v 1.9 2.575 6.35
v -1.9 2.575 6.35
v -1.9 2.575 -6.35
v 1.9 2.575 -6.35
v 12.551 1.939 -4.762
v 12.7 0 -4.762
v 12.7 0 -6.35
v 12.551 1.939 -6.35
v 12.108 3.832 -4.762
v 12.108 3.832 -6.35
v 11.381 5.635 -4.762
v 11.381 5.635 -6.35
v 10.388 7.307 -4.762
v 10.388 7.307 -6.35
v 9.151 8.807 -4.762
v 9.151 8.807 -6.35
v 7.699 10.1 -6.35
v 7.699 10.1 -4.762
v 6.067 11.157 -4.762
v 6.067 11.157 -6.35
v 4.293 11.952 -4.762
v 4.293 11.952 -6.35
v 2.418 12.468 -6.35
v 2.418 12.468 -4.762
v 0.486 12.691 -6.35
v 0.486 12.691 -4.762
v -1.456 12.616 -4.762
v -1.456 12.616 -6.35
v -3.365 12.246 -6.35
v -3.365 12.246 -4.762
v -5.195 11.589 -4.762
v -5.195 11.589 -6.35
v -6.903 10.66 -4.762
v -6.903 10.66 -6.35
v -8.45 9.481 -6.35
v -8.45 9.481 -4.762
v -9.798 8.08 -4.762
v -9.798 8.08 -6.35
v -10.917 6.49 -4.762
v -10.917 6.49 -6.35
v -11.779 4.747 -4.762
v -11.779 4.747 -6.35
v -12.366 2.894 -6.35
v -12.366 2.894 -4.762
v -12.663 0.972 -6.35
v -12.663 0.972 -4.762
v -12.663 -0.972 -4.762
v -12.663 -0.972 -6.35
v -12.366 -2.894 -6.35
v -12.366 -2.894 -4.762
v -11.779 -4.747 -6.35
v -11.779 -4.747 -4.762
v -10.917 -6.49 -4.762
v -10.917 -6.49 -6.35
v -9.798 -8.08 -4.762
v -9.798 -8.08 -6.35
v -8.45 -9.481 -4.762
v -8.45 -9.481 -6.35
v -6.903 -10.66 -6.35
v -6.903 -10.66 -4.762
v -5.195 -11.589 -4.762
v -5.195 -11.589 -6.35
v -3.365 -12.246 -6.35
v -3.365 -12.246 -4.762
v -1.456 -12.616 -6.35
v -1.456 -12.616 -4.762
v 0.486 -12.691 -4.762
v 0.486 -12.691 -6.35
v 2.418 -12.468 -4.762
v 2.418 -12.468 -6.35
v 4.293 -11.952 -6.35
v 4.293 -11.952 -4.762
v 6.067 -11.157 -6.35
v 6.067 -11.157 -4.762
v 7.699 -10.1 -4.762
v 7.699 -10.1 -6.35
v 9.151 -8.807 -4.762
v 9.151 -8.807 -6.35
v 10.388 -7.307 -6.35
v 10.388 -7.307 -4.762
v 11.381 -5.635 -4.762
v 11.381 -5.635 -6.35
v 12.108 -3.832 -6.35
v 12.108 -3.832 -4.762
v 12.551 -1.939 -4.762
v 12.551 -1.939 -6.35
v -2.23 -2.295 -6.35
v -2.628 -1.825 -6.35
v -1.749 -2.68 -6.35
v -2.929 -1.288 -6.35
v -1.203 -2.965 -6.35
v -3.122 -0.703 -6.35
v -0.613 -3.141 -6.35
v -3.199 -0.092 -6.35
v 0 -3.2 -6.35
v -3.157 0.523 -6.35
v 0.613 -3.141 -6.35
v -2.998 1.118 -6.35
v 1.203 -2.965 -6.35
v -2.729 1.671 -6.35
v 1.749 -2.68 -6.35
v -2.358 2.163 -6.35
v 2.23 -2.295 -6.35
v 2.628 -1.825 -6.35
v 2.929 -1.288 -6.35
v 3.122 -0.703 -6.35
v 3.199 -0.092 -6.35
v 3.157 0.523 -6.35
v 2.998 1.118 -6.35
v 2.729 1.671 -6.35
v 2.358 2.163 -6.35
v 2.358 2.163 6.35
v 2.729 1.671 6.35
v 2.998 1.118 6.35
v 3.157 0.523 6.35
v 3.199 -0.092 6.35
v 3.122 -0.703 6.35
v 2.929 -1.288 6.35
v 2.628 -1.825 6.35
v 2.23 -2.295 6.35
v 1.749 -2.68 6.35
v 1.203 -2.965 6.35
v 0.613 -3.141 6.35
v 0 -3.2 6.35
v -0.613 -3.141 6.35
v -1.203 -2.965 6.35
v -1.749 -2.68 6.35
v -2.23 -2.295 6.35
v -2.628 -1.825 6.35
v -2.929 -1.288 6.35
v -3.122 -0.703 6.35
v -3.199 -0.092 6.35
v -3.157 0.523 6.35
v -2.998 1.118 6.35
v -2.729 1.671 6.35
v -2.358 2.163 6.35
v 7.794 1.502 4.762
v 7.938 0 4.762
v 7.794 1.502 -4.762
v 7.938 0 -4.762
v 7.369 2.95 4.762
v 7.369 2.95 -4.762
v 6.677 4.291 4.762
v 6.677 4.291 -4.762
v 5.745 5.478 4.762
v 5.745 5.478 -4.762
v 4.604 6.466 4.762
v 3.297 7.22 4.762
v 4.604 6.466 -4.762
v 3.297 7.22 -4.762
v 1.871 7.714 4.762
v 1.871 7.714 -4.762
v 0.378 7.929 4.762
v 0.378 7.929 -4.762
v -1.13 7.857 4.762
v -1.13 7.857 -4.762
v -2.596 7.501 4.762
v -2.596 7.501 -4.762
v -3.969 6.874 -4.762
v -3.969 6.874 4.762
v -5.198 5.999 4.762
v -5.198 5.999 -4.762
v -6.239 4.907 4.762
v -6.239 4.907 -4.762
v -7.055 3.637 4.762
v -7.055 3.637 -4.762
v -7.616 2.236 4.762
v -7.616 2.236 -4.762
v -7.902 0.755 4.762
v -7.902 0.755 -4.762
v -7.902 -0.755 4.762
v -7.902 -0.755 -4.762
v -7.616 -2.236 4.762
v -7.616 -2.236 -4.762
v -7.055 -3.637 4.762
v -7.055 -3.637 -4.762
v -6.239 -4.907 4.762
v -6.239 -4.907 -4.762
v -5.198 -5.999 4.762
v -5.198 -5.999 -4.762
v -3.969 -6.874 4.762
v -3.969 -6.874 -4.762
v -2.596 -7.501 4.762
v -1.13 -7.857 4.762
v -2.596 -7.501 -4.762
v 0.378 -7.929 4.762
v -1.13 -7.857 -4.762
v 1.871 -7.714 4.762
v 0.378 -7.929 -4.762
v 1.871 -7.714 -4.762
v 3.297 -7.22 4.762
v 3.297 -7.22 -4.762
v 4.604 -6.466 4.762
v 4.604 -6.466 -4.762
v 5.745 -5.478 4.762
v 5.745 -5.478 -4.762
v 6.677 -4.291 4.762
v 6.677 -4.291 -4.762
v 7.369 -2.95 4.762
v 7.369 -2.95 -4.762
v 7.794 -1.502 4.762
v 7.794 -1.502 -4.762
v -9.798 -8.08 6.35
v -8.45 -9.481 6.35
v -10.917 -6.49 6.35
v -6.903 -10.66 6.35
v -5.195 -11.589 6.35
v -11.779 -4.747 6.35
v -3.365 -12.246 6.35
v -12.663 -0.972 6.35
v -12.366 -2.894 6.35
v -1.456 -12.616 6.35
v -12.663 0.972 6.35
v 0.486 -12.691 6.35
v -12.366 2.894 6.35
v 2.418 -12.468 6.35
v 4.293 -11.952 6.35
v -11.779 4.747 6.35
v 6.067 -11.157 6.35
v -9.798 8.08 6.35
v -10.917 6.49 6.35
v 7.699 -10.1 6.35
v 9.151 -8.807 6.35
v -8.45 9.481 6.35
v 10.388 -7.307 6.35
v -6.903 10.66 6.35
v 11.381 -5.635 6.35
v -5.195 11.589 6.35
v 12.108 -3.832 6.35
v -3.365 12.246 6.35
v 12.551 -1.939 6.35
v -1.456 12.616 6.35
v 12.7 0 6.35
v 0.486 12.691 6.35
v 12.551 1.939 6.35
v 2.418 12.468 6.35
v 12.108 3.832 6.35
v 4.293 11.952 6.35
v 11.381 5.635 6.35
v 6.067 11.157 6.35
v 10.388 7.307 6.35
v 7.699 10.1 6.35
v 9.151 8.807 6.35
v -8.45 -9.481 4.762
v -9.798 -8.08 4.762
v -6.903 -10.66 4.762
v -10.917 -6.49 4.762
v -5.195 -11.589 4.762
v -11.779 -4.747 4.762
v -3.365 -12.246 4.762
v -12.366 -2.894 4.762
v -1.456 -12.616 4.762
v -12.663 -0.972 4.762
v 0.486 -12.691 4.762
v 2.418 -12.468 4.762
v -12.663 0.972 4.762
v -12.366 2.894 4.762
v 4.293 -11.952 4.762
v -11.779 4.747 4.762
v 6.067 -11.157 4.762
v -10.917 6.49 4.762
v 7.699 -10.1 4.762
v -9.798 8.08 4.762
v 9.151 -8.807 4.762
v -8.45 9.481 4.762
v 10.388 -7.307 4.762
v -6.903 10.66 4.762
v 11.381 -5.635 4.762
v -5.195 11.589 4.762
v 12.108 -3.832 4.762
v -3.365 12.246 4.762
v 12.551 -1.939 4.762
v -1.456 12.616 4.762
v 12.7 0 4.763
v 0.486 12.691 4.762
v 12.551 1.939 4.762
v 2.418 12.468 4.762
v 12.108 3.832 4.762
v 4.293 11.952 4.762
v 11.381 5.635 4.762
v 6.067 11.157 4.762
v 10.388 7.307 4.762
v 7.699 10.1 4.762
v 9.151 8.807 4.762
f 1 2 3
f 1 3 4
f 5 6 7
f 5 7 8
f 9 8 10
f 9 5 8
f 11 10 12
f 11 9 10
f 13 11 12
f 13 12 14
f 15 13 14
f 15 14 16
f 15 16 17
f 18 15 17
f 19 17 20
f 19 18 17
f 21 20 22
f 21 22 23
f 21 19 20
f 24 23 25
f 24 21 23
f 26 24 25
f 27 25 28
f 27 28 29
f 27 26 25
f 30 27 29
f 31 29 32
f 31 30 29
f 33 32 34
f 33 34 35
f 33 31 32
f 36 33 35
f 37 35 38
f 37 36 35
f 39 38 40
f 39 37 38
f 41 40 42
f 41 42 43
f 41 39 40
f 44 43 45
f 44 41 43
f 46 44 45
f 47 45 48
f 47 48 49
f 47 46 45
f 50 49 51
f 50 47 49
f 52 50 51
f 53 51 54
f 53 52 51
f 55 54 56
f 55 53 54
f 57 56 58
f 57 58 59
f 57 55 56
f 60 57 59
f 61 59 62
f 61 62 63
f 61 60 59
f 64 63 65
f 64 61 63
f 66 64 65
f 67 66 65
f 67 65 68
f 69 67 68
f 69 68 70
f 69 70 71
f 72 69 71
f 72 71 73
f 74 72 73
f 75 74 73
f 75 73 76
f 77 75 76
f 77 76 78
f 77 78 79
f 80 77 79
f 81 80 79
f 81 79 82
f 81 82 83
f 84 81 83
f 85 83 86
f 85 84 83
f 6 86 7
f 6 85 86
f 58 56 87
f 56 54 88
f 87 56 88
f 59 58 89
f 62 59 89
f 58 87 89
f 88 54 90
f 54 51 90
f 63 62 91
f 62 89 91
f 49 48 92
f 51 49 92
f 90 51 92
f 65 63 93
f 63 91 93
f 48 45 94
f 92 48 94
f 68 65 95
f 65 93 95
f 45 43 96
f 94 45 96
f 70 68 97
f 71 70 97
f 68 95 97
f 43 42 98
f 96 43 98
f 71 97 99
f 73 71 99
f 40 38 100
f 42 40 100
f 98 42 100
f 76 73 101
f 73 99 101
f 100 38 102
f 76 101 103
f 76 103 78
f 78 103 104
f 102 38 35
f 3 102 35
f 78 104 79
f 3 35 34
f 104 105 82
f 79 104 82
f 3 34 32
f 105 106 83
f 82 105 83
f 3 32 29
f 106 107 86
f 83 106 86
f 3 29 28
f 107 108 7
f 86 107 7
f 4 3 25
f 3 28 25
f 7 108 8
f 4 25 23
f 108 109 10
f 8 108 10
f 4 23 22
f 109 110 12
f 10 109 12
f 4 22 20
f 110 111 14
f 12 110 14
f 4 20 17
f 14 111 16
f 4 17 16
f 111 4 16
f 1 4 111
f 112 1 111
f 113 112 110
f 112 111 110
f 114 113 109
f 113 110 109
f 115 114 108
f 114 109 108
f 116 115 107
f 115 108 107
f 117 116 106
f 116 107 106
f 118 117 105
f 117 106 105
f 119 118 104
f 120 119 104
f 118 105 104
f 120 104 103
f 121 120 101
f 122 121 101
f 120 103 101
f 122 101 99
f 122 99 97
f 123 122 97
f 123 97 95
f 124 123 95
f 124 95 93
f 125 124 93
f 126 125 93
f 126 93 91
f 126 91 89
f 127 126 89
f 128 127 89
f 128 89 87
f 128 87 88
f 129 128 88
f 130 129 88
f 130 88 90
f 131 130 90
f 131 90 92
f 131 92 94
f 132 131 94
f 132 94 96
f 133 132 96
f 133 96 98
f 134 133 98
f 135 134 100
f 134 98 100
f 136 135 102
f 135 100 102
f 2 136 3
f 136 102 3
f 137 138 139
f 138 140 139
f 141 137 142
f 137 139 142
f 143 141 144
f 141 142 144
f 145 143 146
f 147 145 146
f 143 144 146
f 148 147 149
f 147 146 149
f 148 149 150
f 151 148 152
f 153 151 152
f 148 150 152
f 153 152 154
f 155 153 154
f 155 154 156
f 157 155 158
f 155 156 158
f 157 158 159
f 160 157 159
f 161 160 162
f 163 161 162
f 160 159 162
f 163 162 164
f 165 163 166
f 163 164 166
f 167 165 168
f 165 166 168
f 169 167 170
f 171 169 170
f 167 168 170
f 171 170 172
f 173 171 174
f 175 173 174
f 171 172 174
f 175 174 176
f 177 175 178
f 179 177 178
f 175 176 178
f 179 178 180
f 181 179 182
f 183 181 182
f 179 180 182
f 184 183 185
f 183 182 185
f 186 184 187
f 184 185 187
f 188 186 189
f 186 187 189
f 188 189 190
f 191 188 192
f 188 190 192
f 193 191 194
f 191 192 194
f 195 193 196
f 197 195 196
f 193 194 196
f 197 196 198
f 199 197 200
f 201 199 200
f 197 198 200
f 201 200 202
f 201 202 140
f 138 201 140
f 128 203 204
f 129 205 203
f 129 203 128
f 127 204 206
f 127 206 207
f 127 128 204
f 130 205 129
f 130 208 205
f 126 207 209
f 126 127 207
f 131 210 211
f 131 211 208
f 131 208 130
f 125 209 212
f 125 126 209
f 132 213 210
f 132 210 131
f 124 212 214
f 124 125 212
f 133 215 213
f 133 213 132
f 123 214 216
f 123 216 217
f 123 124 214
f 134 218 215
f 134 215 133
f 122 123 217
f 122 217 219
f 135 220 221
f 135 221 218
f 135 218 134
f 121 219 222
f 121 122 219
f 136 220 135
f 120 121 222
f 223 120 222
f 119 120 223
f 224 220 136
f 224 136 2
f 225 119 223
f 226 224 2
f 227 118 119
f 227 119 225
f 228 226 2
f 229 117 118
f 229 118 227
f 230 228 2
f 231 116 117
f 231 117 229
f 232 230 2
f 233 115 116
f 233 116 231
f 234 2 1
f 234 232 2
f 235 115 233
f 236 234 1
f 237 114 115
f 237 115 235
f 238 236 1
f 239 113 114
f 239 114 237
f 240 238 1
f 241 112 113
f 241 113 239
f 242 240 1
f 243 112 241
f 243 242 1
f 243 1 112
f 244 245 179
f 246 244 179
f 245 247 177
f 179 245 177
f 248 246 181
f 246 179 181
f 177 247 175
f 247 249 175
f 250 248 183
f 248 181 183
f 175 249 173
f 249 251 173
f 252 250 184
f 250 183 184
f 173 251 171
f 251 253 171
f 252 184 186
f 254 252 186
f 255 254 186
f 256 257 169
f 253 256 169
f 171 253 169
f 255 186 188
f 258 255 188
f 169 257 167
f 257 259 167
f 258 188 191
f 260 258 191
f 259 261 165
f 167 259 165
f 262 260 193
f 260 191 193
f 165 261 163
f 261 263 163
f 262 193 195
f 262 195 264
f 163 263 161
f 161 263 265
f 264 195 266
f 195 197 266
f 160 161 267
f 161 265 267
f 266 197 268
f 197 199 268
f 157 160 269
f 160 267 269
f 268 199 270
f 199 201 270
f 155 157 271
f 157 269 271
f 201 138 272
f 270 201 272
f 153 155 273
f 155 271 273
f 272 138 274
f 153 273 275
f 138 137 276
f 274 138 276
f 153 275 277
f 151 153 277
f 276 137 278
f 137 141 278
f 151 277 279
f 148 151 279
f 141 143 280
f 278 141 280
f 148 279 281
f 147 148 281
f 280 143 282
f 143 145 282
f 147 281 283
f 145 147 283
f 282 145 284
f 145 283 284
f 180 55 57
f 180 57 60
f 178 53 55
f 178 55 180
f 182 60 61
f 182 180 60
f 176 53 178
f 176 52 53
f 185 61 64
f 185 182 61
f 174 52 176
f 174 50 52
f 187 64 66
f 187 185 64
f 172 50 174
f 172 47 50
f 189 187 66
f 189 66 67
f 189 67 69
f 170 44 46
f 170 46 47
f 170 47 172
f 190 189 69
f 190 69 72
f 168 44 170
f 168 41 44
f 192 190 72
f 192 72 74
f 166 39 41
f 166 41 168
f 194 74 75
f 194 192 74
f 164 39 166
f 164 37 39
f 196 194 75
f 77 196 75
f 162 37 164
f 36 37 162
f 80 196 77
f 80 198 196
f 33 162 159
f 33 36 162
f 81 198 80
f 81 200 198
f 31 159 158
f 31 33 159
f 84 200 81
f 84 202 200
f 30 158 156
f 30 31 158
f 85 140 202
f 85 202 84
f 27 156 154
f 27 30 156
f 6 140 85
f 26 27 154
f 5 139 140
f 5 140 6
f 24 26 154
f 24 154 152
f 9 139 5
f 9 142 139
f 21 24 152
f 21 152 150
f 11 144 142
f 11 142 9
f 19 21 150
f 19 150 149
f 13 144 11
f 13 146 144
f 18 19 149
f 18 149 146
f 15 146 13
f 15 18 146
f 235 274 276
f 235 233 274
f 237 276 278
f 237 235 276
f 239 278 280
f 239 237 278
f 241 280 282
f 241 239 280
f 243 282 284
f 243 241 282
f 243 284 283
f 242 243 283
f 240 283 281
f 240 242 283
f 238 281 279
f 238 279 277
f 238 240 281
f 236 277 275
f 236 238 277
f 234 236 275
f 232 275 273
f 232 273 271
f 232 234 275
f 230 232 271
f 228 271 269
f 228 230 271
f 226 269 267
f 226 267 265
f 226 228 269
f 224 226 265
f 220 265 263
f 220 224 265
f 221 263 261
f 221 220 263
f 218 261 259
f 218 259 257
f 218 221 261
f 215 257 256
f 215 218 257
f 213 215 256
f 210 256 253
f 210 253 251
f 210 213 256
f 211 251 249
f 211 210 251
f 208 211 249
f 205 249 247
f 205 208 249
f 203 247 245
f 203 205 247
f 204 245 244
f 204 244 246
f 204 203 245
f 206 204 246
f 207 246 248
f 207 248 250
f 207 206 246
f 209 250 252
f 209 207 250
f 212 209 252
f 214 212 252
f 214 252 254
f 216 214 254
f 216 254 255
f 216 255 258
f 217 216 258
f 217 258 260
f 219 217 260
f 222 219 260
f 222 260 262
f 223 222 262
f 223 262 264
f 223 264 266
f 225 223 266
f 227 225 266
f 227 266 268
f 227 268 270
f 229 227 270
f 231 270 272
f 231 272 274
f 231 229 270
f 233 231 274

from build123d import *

# Parameters (mm, degrees)
SKETCH1_R               = 12.7
BASE_VOLUME_DEPTH       = 6.35
SKETCH2_OUTSIDE_W       = 35.02
SKETCH2_OUTSIDE_H       = 35.02
SKETCH2_OUTSIDE_R       = 7.9375
ENCAVURE_DEPTH          = 4.7625
TROU_SHAFT_D_DEPTH      = 20.05
TROU_SHAFT_D_DEPTH_BACK = 20.05


with BuildPart() as part:
    # Sketch1 → base_volume (new, symmetric)
    with BuildSketch(Plane.XY):
        Circle(SKETCH1_R)
    extrude(amount=BASE_VOLUME_DEPTH, both=True)

    # Sketch2 outside → encavure (cut, symmetric)
    with BuildSketch(Plane.XY):
        Rectangle(SKETCH2_OUTSIDE_W, SKETCH2_OUTSIDE_H)
        Circle(SKETCH2_OUTSIDE_R, mode=Mode.SUBTRACT)
    extrude(amount=ENCAVURE_DEPTH, both=True, mode=Mode.SUBTRACT)

    # Sketch3 → trou_shaft_D (cut, two sides: drawn at the far end of the back side and taken through both)
    with BuildSketch(Plane.XY.offset(-TROU_SHAFT_D_DEPTH_BACK)):
        with BuildLine():
            Line((-1.9, 2.574878638), (1.9, 2.574878638))
            ThreePointArc((1.9, 2.574878638), (0, -3.2), (-1.9, 2.574878638))
        make_face()
    extrude(amount=TROU_SHAFT_D_DEPTH + TROU_SHAFT_D_DEPTH_BACK, mode=Mode.SUBTRACT)


solid = part.part
